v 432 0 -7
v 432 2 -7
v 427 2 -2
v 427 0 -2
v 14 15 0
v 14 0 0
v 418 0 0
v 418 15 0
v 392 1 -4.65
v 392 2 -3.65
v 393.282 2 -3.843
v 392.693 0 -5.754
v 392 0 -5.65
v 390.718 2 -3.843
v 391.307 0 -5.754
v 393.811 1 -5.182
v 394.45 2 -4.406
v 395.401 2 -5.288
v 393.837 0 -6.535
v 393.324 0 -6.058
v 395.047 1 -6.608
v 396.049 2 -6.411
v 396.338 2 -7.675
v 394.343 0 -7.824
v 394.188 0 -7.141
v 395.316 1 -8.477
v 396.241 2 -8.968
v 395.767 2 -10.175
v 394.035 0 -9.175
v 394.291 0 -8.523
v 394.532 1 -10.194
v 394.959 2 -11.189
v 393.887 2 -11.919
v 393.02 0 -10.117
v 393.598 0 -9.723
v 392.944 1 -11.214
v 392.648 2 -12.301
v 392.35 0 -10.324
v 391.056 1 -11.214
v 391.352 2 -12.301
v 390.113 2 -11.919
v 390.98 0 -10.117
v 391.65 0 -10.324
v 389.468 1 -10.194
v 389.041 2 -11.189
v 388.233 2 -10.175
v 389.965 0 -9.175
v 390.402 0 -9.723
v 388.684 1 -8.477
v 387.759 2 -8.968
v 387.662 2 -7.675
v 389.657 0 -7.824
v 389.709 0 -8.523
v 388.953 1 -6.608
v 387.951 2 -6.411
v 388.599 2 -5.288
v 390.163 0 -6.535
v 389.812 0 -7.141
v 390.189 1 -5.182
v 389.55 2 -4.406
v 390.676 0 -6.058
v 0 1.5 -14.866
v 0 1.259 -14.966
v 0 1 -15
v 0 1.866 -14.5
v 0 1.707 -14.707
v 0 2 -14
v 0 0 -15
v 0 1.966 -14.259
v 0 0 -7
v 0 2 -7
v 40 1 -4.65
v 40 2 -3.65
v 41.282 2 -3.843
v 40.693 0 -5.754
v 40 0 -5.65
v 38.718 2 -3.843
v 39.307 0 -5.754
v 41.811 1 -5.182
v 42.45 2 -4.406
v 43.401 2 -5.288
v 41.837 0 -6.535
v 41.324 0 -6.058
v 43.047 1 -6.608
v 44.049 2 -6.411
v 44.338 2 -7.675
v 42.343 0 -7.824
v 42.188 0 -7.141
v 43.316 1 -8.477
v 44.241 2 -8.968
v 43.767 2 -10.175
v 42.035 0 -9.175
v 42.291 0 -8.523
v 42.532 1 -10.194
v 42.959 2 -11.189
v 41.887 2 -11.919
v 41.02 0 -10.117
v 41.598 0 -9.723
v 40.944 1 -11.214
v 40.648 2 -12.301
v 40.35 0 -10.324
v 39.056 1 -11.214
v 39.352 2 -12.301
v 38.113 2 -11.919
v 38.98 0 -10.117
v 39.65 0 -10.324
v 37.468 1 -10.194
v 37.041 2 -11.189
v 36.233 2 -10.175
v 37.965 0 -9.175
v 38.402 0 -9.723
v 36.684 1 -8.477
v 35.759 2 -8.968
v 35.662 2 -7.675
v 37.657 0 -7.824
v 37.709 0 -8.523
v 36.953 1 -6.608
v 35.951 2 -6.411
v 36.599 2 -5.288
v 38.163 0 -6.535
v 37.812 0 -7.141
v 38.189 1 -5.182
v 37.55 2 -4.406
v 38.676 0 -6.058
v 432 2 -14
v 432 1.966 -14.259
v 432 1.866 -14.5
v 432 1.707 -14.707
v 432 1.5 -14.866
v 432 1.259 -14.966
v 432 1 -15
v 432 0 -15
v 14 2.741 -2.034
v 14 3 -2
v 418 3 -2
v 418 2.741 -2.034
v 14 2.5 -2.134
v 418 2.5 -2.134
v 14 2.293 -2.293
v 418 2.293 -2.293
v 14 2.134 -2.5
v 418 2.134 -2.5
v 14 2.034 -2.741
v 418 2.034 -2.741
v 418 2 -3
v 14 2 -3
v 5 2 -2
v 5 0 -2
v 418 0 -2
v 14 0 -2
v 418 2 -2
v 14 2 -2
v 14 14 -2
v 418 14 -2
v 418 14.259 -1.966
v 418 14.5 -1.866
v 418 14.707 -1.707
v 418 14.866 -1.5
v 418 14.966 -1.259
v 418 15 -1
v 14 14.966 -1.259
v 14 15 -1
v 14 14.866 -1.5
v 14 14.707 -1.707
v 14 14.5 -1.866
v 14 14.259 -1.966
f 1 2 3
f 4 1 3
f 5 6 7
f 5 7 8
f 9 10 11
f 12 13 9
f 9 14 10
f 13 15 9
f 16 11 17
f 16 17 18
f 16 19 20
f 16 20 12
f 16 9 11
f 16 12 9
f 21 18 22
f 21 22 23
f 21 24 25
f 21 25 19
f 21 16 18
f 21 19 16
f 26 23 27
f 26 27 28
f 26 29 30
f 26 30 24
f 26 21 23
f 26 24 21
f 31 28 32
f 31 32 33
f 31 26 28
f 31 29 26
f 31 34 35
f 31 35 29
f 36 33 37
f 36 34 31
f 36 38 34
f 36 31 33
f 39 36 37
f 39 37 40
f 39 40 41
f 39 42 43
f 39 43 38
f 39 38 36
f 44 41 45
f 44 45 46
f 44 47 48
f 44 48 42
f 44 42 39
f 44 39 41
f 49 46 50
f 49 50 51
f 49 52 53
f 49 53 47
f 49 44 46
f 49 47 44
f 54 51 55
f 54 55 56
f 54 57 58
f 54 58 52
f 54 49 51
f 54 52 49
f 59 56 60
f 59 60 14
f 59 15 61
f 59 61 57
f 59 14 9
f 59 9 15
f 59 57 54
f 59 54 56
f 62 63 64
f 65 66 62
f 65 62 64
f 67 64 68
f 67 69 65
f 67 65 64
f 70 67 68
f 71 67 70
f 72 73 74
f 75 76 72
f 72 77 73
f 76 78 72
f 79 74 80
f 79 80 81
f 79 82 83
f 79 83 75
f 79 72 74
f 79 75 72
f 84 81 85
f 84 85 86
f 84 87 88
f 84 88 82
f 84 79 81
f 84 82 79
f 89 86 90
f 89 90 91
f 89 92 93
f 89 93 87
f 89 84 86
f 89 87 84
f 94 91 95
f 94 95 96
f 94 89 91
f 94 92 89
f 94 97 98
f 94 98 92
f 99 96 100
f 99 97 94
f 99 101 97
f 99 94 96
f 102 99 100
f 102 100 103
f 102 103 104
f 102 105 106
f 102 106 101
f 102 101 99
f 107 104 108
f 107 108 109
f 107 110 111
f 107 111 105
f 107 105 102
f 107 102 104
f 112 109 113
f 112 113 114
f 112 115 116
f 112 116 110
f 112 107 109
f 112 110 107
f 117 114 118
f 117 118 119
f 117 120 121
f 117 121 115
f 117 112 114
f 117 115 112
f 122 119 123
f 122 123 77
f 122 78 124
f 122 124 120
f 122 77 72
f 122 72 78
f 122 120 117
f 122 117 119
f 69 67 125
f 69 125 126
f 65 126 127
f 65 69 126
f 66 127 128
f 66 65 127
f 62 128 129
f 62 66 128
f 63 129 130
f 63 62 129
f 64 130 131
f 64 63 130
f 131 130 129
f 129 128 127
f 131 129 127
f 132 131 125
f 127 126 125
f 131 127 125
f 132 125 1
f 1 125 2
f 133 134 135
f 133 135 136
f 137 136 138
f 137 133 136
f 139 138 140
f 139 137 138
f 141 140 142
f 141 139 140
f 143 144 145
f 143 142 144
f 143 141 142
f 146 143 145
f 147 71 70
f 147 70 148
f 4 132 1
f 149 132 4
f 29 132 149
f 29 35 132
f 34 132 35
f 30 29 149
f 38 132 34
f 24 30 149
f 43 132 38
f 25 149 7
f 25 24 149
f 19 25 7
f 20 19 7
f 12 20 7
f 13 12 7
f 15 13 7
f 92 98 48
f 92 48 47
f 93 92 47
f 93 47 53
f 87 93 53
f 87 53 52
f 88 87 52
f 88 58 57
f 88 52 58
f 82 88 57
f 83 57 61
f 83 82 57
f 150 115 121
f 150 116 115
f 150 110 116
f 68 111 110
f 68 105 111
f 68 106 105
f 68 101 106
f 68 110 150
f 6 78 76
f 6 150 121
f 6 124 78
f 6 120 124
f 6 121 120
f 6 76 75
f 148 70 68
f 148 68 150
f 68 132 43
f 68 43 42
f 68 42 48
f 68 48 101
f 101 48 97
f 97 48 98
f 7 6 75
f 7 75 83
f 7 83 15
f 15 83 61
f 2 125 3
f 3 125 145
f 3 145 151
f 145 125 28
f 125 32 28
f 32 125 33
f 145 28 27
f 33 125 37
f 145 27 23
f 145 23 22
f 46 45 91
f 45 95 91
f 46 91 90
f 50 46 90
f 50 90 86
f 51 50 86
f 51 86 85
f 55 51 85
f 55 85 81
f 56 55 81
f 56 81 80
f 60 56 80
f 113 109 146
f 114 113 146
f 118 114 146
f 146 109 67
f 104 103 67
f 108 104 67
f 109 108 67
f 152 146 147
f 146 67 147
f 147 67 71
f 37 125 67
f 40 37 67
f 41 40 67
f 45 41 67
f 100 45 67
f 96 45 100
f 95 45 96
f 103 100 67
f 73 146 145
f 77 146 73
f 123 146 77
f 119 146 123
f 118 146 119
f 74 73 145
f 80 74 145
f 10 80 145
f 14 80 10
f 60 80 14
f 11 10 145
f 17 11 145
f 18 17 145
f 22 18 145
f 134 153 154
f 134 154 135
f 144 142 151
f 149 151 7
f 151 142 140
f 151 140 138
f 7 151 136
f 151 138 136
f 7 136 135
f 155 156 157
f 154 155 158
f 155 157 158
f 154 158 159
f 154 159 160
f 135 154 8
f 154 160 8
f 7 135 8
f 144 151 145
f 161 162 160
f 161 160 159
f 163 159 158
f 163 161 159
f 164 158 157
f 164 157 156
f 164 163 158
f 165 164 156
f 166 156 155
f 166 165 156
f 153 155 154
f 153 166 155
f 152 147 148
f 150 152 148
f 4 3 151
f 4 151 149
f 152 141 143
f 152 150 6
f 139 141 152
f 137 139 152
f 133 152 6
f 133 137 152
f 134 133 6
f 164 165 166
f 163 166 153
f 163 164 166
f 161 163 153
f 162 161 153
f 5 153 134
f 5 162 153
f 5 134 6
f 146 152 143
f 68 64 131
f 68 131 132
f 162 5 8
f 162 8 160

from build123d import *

# Parameters (mm, degrees)
EXTRUDE_1_DEPTH     = 432
CUT_EXTRUDE_5_DEPTH = 14
CUT_EXTRUDE_6_DEPTH = 14
CUT_EXTRUDE_7_DEPTH = 433.455778086
SKETCH_10_R         = 2.3
CUT_EXTRUDE_8_DEPTH = 433.455778086
CHAMFER_1_SIZE      = 2.05


with BuildPart() as part:
    # Эскиз1 → Бобышка-Вытянуть1 (new body)
    with BuildSketch(Plane(origin=(0, 0, 0), x_dir=(0, 0, -1), z_dir=(1, 0, 0))):
        with BuildLine():
            Line((0, 0), (0, 15))
            Line((0, 15), (1, 15))
            ThreePointArc((1, 15), (1.707106781, 14.707106781), (2, 14))
            Line((2, 14), (2, 3))
            ThreePointArc((2, 3), (2.292893219, 2.292893219), (3, 2))
            Line((3, 2), (14, 2))
            ThreePointArc((14, 2), (14.707106781, 1.707106781), (15, 1))
            Line((15, 1), (15, 0))
            Line((15, 0), (0, 0))
        make_face()
    extrude(amount=EXTRUDE_1_DEPTH)

    # Эскиз6 → Вырез-Вытянуть5 (cut)
    with BuildSketch(Plane(origin=(432, 0, 0), x_dir=(0, 0, -1), z_dir=(1, 0, 0))):
        Polygon((0, 15), (2, 15), (3, 15), (3, 2), (2, 2), (2, 0), (0, 0), align=None)
    extrude(amount=-CUT_EXTRUDE_5_DEPTH, mode=Mode.SUBTRACT)

    # Эскиз7 → Вырез-Вытянуть6 (cut)
    with BuildSketch(Plane.ZY):
        Polygon((0, 15), (-2, 15), (-3, 15), (-3, 2), (-2, 2), (-2, 0), (0, 0), align=None)
    extrude(amount=-CUT_EXTRUDE_6_DEPTH, mode=Mode.SUBTRACT)

    # Эскиз9 → Вырез-Вытянуть7 (cut, through all)
    with BuildSketch(Plane(origin=(0, 2, 0), x_dir=(1, 0, 0), z_dir=(0, 1, 0))):
        Polygon((0, 2), (0, 7), (5, 2), align=None)
        Polygon((432, 2), (432, 7), (427, 2), align=None)
    extrude(amount=-CUT_EXTRUDE_7_DEPTH, mode=Mode.SUBTRACT)

    # Эскиз10 → Вырез-Вытянуть8 (cut, through all)
    with BuildSketch(Plane(origin=(0, 2, 0), x_dir=(1, 0, 0), z_dir=(0, 1, 0))):
        with Locations(Location((40, 8, 0), (0, 0, 270))):
            Circle(SKETCH_10_R)
        with Locations(Location((392, 8, 0), (0, 0, 270))):
            Circle(SKETCH_10_R)
    extrude(amount=-CUT_EXTRUDE_8_DEPTH, mode=Mode.SUBTRACT)

    # Фаска1
    # the kernel refuses this chamfer: 2.05 mm, written as the material it takes off along each edge
    with BuildSketch(Plane(origin=(40, 2, -8), x_dir=(0, 0, 1), z_dir=(-1, 0, 0))) as chamfer_1_piece_1:
        Polygon((2.3 + CHAMFER_1_SIZE, 0), (2.3, -CHAMFER_1_SIZE), (2.3, 0), align=None)
    revolve(axis=Axis((40, 2, -8), (0, 1, 0)), mode=Mode.SUBTRACT)
    with BuildSketch(Plane(origin=(392, 2, -8), x_dir=(0, 0, 1), z_dir=(-1, 0, 0))) as chamfer_1_piece_2:
        Polygon((2.3 + CHAMFER_1_SIZE, 0), (2.3, -CHAMFER_1_SIZE), (2.3, 0), align=None)
    revolve(axis=Axis((392, 2, -8), (0, 1, 0)), mode=Mode.SUBTRACT)


solid = part.part
